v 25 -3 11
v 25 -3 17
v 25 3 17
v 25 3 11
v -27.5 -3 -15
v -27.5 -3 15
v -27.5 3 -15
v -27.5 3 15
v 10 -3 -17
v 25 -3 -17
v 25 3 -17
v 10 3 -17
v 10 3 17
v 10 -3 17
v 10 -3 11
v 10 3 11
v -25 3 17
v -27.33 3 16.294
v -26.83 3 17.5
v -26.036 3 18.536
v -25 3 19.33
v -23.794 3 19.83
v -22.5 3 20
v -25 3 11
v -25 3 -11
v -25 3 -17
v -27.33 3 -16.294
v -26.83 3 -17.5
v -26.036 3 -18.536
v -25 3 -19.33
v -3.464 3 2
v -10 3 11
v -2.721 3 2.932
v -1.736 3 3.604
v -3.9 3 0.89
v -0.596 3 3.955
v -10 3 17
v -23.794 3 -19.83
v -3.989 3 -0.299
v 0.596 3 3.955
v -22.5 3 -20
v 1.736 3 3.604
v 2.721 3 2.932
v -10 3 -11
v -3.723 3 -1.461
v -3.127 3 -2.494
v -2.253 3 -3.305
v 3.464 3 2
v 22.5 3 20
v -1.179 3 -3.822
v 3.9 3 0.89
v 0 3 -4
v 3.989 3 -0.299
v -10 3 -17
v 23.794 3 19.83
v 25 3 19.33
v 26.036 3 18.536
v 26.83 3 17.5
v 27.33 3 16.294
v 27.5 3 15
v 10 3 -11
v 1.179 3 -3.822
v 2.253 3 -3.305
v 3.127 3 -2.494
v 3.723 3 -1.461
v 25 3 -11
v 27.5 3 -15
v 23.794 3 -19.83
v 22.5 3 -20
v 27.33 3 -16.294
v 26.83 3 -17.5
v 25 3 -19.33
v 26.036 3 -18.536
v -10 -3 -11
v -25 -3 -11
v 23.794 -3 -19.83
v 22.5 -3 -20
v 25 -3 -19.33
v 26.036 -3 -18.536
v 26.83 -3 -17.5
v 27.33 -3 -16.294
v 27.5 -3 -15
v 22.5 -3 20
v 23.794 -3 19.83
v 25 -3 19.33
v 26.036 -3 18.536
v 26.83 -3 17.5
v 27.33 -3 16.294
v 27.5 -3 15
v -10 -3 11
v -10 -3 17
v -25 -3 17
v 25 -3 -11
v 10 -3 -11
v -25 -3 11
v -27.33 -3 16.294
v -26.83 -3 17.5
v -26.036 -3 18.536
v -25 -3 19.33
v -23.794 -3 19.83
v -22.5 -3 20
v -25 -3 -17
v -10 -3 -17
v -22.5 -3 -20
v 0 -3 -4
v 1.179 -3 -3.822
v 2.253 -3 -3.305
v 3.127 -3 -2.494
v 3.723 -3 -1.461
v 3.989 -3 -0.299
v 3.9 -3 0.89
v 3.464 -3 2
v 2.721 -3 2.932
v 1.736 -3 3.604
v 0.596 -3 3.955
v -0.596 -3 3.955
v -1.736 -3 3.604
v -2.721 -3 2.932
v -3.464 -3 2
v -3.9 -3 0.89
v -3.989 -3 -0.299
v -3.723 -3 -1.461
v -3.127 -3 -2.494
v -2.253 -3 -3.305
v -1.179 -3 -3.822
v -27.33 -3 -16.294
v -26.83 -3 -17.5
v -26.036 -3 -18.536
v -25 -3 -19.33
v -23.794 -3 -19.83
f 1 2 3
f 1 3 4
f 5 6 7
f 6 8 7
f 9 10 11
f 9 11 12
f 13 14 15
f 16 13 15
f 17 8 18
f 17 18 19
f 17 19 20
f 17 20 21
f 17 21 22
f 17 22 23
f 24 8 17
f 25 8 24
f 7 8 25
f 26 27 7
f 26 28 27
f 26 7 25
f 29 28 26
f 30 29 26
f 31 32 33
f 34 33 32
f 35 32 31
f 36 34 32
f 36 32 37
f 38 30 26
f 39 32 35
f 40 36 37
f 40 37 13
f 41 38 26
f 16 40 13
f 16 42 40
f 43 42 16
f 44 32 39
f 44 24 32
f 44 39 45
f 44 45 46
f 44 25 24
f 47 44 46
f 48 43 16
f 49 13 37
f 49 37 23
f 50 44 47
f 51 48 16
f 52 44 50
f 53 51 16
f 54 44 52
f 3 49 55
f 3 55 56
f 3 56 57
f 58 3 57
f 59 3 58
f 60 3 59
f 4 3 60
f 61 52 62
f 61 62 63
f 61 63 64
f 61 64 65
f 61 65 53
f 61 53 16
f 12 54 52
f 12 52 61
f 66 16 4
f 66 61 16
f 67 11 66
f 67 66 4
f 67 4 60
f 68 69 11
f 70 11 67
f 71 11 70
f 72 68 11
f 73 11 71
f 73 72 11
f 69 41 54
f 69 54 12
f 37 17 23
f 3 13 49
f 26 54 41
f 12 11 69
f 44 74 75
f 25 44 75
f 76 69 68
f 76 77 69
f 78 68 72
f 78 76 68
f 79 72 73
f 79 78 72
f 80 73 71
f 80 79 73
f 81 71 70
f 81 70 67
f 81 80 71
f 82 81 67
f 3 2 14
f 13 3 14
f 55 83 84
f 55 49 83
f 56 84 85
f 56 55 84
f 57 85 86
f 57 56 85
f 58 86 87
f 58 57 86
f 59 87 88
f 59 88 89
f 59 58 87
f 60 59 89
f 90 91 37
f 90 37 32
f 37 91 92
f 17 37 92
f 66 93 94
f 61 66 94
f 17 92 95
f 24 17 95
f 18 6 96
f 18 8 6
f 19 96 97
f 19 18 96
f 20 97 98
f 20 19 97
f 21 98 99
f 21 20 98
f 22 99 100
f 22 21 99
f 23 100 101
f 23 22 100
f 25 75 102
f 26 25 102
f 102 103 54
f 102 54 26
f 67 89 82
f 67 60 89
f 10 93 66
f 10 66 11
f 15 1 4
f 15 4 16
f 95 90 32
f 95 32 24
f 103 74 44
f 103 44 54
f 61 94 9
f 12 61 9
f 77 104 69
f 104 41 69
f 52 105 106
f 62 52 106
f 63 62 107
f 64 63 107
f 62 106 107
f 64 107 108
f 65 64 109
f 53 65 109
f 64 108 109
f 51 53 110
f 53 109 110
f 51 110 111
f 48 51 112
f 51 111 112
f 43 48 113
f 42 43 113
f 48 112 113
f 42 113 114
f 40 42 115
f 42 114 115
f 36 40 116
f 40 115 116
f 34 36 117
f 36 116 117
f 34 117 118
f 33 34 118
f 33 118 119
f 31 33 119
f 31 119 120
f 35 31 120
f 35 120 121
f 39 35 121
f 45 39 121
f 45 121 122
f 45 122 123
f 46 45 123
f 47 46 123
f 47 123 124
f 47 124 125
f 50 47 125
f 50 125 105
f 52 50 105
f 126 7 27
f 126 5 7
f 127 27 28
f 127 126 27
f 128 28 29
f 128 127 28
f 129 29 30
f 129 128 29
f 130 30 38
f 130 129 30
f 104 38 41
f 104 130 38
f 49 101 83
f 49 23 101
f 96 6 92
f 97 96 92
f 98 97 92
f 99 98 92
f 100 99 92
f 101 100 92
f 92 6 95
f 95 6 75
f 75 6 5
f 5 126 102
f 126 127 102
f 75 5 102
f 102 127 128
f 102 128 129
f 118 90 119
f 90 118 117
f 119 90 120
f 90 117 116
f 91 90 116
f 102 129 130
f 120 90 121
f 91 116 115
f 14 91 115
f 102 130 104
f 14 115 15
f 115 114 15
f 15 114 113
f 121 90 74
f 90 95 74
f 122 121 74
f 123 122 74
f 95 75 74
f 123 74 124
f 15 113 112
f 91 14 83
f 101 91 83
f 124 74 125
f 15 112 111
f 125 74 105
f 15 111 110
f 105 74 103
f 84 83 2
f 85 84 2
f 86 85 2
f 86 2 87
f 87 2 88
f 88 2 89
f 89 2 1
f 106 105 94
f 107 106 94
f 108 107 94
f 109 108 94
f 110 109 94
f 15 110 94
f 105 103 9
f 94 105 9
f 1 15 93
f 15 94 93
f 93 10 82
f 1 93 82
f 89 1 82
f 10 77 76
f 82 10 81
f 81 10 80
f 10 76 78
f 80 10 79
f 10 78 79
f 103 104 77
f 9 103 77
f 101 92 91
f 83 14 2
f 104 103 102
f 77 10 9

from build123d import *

# Parameters (mm, degrees)
CROQUIS1_W              = 55
CROQUIS1_H              = 40
SALIENTE_EXTRUIR1_DEPTH = 3
CROQUIS2_W              = 15
CROQUIS2_H              = 6
CORTAR_EXTRUIR1_DEPTH   = 35.528973341
CROQUIS3_R              = 4
CORTAR_EXTRUIR2_DEPTH   = 35.528973341
REDONDEO1_R             = 5


with BuildPart() as part:
    # Croquis1 → Saliente-Extruir1 (new, symmetric)
    with BuildSketch(Plane(origin=(0, 0, 0), x_dir=(1, 0, 0), z_dir=(0, 1, 0))):
        Rectangle(CROQUIS1_W, CROQUIS1_H)
    extrude(amount=SALIENTE_EXTRUIR1_DEPTH, both=True)

    # Croquis2 → Cortar-Extruir1 (cut, through all)
    with BuildSketch(Plane(origin=(0, -3, 0), x_dir=(-1, 0, 0), z_dir=(0, -1, 0))):
        with Locations((17.5, -14)):
            Rectangle(CROQUIS2_W, CROQUIS2_H)
        with Locations((-17.5, -14)):
            Rectangle(CROQUIS2_W, CROQUIS2_H)
        with Locations((17.5, 14)):
            Rectangle(CROQUIS2_W, CROQUIS2_H)
        with Locations((-17.5, 14)):
            Rectangle(CROQUIS2_W, CROQUIS2_H)
    extrude(amount=-CORTAR_EXTRUIR1_DEPTH, mode=Mode.SUBTRACT)

    # Croquis3 → Cortar-Extruir2 (cut, through all)
    with BuildSketch(Plane(origin=(0, -3, 0), x_dir=(-1, 0, 0), z_dir=(0, -1, 0))):
        with Locations(Location((0, 0, 0), (0, 0, 90))):
            Circle(CROQUIS3_R)
    extrude(amount=-CORTAR_EXTRUIR2_DEPTH, mode=Mode.SUBTRACT)

    # Redondeo1
    redondeo1_edges = [part.edges().sort_by_distance(p)[0] for p in [
        (27.5, 0, 20),
        (-27.5, 0, 20),
        (-27.5, 0, -20),
        (27.5, 0, -20),
    ]]
    fillet(redondeo1_edges, radius=REDONDEO1_R)


solid = part.part
